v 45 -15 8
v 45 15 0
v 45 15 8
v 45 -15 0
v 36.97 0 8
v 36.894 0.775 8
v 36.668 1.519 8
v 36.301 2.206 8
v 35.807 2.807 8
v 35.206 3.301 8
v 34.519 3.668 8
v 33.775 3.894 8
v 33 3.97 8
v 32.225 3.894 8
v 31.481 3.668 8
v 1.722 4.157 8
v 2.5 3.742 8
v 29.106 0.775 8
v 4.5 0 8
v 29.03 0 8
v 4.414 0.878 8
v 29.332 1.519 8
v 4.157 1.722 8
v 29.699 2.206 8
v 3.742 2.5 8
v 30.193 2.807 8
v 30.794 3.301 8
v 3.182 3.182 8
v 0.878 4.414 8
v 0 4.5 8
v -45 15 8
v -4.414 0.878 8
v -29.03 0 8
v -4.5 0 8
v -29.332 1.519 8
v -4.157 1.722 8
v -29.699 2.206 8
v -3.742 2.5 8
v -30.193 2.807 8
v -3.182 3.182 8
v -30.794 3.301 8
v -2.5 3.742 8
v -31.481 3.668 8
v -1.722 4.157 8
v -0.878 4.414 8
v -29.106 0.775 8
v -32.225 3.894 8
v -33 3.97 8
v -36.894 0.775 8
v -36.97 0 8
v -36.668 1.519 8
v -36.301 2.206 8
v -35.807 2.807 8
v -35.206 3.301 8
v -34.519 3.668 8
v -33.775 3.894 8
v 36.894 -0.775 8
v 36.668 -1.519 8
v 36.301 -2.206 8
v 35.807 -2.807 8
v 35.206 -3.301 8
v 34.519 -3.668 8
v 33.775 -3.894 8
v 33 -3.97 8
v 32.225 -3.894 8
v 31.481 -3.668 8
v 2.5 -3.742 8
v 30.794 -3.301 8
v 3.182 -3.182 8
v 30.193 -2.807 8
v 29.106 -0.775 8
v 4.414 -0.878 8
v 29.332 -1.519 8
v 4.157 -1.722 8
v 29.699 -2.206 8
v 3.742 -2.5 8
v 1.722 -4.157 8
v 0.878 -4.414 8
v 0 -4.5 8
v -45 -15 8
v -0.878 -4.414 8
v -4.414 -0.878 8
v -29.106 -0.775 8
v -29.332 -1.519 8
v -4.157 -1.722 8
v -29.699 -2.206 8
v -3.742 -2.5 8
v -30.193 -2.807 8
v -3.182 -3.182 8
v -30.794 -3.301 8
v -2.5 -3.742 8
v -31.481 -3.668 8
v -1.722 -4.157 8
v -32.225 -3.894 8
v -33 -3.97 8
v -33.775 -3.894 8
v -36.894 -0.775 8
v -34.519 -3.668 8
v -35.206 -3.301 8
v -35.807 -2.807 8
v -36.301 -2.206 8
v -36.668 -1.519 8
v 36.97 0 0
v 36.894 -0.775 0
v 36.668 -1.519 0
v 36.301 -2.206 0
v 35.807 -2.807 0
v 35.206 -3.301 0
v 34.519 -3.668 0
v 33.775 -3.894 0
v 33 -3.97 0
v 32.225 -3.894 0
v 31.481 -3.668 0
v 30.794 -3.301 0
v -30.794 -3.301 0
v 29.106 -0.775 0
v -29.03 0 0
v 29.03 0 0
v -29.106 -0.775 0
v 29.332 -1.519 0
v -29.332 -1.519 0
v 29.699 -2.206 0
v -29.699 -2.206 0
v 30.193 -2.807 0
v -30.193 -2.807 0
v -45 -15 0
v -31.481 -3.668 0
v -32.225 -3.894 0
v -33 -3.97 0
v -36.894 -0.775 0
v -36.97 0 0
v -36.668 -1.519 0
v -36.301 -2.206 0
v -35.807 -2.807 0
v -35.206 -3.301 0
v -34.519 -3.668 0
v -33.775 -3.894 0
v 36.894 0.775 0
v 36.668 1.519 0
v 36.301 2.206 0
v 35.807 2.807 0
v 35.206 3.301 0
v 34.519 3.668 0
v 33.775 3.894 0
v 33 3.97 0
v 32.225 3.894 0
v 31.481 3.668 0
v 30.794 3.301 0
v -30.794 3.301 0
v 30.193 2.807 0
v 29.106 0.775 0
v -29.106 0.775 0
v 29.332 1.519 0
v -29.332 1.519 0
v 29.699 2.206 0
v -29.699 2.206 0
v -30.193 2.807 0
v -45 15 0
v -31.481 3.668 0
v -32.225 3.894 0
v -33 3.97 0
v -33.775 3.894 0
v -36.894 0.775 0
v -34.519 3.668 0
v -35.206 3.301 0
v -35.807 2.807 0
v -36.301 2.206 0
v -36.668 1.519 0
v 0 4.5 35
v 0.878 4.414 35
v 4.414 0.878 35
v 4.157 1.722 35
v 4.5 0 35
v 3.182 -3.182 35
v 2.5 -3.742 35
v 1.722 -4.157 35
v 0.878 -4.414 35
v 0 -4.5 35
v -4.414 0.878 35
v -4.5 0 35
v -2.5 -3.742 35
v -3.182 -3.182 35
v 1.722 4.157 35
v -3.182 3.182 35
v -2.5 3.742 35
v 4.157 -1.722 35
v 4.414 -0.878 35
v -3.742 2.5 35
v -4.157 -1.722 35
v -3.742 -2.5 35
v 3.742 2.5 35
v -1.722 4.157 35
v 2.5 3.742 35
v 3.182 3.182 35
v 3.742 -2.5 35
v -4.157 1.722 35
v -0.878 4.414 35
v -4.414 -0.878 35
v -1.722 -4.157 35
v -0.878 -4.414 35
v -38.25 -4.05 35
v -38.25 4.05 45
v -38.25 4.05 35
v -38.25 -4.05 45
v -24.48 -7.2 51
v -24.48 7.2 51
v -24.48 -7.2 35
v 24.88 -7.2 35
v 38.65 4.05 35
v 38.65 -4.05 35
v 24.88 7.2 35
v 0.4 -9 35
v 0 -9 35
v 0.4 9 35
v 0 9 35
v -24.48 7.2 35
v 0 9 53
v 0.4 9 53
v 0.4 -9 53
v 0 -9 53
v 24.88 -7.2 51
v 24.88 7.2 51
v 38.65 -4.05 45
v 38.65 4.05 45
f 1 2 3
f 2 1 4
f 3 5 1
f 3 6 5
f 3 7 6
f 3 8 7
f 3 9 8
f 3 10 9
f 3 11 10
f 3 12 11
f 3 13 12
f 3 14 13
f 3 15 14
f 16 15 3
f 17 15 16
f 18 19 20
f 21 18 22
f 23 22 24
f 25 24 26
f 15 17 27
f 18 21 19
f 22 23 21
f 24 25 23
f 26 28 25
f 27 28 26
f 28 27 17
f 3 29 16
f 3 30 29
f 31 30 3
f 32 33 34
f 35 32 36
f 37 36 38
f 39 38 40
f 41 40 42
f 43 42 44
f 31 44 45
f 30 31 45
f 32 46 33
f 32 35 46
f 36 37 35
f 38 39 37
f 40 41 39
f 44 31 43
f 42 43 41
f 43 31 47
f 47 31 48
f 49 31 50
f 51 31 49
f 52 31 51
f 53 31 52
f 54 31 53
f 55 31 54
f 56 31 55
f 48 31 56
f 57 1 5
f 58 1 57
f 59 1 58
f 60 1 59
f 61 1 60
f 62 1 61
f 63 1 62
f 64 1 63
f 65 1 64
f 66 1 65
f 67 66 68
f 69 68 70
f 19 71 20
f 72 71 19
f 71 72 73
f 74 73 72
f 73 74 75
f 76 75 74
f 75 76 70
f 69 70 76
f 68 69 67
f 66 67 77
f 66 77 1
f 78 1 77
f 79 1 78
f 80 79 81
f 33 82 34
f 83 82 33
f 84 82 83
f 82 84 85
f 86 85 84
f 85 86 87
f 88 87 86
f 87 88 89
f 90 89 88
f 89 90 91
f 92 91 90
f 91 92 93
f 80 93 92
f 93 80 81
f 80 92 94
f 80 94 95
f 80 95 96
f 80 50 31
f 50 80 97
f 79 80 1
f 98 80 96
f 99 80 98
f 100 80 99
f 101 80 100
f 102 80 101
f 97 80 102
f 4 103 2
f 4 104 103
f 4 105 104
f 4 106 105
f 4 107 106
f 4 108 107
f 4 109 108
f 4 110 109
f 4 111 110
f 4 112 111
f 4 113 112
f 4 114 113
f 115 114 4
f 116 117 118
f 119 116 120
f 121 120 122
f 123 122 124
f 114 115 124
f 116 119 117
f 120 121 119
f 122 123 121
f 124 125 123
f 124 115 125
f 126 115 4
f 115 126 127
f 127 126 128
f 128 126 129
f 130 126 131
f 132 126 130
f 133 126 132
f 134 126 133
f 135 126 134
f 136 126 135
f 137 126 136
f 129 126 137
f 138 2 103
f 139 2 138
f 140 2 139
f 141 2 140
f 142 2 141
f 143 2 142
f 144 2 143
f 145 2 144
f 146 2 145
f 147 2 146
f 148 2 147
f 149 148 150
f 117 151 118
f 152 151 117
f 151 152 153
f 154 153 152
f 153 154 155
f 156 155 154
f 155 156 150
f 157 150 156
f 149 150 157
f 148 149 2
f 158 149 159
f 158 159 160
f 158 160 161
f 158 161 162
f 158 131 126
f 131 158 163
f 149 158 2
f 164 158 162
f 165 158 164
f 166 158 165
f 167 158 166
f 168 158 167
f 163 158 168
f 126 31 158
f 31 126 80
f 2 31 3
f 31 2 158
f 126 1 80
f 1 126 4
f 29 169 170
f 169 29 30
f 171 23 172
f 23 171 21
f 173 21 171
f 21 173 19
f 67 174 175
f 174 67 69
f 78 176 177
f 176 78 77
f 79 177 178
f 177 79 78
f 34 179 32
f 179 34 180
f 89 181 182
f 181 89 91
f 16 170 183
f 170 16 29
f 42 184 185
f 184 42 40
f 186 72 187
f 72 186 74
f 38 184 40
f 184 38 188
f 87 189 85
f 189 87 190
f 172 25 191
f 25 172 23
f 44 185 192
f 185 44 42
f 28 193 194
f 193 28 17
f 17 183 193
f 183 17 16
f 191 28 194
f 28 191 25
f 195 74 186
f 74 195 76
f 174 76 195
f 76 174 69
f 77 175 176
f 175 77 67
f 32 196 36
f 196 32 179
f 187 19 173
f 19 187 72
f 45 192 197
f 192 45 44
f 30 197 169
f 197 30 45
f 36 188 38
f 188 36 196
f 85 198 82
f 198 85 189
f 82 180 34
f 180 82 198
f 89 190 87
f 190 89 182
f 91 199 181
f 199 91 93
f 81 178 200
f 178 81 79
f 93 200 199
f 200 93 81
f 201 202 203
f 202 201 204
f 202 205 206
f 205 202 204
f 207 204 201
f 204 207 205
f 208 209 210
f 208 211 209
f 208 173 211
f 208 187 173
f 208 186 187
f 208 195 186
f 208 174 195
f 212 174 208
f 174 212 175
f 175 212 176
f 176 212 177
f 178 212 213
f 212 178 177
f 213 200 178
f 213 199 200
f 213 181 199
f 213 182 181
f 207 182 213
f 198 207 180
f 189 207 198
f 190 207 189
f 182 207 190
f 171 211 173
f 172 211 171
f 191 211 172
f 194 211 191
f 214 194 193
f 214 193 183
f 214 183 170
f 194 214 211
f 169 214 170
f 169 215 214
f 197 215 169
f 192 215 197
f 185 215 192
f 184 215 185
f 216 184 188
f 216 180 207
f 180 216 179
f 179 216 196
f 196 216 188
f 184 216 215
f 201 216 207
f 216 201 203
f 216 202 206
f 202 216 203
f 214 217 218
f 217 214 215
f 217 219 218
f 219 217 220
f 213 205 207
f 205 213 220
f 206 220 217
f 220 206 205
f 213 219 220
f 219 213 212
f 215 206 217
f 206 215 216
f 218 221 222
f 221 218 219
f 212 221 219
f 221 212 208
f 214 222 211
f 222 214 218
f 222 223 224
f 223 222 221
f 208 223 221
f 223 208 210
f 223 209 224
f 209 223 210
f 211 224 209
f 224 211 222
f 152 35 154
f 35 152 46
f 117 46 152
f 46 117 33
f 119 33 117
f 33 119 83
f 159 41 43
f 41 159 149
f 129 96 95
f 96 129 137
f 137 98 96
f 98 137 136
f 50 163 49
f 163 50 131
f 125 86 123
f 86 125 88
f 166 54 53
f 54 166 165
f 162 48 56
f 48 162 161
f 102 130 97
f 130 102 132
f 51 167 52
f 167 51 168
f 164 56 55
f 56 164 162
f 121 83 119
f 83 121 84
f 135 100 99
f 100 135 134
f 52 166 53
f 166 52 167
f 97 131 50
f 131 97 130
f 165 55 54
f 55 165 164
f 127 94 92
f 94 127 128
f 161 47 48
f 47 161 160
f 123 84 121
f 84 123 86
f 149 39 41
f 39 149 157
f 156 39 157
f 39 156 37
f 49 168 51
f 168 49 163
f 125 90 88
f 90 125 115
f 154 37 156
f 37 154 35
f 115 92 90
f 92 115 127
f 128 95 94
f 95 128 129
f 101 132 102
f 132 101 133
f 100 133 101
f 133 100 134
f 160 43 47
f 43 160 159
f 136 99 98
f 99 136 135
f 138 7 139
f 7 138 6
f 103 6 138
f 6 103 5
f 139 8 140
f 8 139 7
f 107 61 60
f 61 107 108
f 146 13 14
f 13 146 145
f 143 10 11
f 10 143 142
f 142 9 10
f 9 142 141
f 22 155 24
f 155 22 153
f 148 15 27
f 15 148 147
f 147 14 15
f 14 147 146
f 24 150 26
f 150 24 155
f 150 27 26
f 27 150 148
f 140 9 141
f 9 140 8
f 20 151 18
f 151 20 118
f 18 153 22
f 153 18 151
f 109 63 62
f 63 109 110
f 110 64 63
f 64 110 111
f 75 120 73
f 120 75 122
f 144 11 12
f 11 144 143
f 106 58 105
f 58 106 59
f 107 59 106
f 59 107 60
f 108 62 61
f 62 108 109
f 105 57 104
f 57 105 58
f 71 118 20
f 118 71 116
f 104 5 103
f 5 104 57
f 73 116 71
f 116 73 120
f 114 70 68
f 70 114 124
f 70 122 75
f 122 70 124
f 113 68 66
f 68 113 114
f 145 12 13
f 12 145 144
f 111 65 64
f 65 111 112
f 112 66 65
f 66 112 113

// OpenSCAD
$fn = 32;

// ----------------------------------------------------------------------
// Boat cleat: 90 mm base, horn 44 mm up
// ----------------------------------------------------------------------

// --- parameters (mm) ---
base_l = 90;              // base length
base_w = 30;              // base width
base_t = 8;               // base thickness
horn_len = 76.5;          // horn length
horn_d = 18;              // horn diameter at the middle
horn_z = 44;              // horn axis height
end_drop = 8;             // how far the horn tips drop
post_d = 9;               // centre post diameter
holes_d = 7.94;           // fixing holes
hole_x = 33;              // fixing hole spacing

difference() {
  union() {
    translate([-45, -15, 0]) cube([base_l, base_w, base_t]);
    /* centre post, sunk 1 mm into the base */
    translate([0, 0, 7]) cylinder(h = 37, d = post_d);
    /* horn: a hull chain of boxes, full in the middle and lighter at the tips */
    hull() {
      translate([-38.25, -4.05, 35]) cube([0.4, 8.1, 10], center = false);
      translate([-24.48, -7.2, 35]) cube([0.4, 14.4, 16], center = false);
    }
    hull() {
      translate([-24.48, -7.2, 35]) cube([0.4, 14.4, 16], center = false);
      translate([0, -9, 35]) cube([0.4, 18, 18], center = false);
    }
    hull() {
      translate([0, -9, 35]) cube([0.4, 18, 18], center = false);
      translate([24.48, -7.2, 35]) cube([0.4, 14.4, 16], center = false);
    }
    hull() {
      translate([24.48, -7.2, 35]) cube([0.4, 14.4, 16], center = false);
      translate([38.25, -4.05, 35]) cube([0.4, 8.1, 10], center = false);
    }
  }
  translate([-33, 0, -2.5]) cylinder(h = base_t + 5, d = holes_d);
  translate([33, 0, -2.5]) cylinder(h = base_t + 5, d = holes_d);
}
